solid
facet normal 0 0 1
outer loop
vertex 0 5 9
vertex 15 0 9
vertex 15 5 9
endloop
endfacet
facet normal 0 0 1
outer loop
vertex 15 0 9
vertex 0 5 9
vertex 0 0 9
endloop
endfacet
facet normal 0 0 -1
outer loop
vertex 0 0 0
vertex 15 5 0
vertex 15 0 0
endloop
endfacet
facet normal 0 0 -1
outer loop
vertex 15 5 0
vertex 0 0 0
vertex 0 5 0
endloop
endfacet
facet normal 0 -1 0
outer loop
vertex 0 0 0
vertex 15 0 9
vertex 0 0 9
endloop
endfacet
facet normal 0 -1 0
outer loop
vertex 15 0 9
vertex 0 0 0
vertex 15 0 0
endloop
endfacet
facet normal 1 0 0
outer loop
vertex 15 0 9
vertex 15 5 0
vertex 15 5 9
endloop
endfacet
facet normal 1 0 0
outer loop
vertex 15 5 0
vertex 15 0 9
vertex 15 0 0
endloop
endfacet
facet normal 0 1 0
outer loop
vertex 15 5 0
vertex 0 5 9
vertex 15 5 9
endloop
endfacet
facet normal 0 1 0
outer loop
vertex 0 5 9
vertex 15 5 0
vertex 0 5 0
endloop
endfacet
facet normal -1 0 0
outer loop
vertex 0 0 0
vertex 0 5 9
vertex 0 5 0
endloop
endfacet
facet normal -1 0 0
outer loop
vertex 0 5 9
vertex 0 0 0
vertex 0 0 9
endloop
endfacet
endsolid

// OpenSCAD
// Generated by SolidPython 1.0.1 on 2020-07-29 00:46:55


cube(size = [15, 5, 9]);
/***********************************************
*********      SolidPython code:      **********
************************************************
 
# import packages: SolidPython
from solid import *
from solid.utils import *
from itertools import chain, combinations, permutations


class Resize:

    def __init__(self, scad_file):
        self.scad_file = scad_file
        #self.scad_file = import_scad(scad_file)
        # cone/cylinder param:
        self.r1 = 0
        self.r2 = 0
        self.h = 0
        # rectangular prism param:
        self.w = 0
        self.l = 0
        # ellipse param:
        self.r = 0

    # import OpenScad code (file name corresponds to shape)


    # classify shape + parameters
    def assign(self, param1, param2, param3):
        if self.scad_file == 'cone.scad':
            self.r1 = param1
            self.r2 = param2
            self.h = param3
        elif self.scad_file == 'cylinder.scad':
            self.r1 = param1
            self.r2 = param2
            self.h = param3
        elif self.scad_file == 'rectangularPrism.scad':
            self.h = param1
            self.l = param2
            self.w = param3
        else:
            self.r = param1
            self.h = param2

    # resize parameters
    def iterate(self):
        x = range(3, 20, 2)
        i = 1
        if self.scad_file == 'cone.scad':
            tempList = list(permutations(x, 2))
            for temp in tempList:
                param1 = temp[0]
                param2 = temp[1]
                filepath = 'produced_scad_files/' + 'cone' + str(param1) + '_' + str(param2) + '_' + '.scad'
                scad_render_to_file(cylinder(h=param1, r1=param2, r2=0), filepath)

        elif self.scad_file == 'cylinder.scad':
            tempList = list(permutations(x, 3))
            for temp in tempList:
                param1 = temp[0]
                param2 = temp[1]
                filepath = 'produced_scad_files/' + 'cylinder' + str(param1) + '_' + str(param2) + '_' + '.scad'
                scad_render_to_file(cylinder(h=param1, r1=param2, r2=param2), filepath)

        elif self.scad_file == 'rectangularPrism.scad':
            tempList = list(permutations(x, 3))
            for temp in tempList:
                param1 = temp[0]
                param2 = temp[1]
                param3 = temp[2]
                filepath = 'produced_scad_files/' + 'rectangularPrism' + str(param1) + '_' + str(param2) + '_' + str(
                    param3) + '.scad'
                scad_render_to_file(cube(size=(param1, param2, param3)), filepath)

        elif self.scad_file == 'ellipse.scad':
            tempList = list(permutations(x, 4))
            for temp in tempList:
                param1 = temp[0]
                param2 = temp[1]
                param3 = temp[2]
                param4 = temp[3]
                filepath = 'produced_scad_files/' + 'ellipse' + str(param1) + '_' + str(param2) + '_' + str(param3) + '_' + str(param4) + '.scad'
                scad_render_to_file(scale([param1, param2, param3])(sphere(r=param4)), filepath)

    def render_to_scadfile(self):
        scad_render_to_file(scad, 'example.scad') 
 
************************************************/
